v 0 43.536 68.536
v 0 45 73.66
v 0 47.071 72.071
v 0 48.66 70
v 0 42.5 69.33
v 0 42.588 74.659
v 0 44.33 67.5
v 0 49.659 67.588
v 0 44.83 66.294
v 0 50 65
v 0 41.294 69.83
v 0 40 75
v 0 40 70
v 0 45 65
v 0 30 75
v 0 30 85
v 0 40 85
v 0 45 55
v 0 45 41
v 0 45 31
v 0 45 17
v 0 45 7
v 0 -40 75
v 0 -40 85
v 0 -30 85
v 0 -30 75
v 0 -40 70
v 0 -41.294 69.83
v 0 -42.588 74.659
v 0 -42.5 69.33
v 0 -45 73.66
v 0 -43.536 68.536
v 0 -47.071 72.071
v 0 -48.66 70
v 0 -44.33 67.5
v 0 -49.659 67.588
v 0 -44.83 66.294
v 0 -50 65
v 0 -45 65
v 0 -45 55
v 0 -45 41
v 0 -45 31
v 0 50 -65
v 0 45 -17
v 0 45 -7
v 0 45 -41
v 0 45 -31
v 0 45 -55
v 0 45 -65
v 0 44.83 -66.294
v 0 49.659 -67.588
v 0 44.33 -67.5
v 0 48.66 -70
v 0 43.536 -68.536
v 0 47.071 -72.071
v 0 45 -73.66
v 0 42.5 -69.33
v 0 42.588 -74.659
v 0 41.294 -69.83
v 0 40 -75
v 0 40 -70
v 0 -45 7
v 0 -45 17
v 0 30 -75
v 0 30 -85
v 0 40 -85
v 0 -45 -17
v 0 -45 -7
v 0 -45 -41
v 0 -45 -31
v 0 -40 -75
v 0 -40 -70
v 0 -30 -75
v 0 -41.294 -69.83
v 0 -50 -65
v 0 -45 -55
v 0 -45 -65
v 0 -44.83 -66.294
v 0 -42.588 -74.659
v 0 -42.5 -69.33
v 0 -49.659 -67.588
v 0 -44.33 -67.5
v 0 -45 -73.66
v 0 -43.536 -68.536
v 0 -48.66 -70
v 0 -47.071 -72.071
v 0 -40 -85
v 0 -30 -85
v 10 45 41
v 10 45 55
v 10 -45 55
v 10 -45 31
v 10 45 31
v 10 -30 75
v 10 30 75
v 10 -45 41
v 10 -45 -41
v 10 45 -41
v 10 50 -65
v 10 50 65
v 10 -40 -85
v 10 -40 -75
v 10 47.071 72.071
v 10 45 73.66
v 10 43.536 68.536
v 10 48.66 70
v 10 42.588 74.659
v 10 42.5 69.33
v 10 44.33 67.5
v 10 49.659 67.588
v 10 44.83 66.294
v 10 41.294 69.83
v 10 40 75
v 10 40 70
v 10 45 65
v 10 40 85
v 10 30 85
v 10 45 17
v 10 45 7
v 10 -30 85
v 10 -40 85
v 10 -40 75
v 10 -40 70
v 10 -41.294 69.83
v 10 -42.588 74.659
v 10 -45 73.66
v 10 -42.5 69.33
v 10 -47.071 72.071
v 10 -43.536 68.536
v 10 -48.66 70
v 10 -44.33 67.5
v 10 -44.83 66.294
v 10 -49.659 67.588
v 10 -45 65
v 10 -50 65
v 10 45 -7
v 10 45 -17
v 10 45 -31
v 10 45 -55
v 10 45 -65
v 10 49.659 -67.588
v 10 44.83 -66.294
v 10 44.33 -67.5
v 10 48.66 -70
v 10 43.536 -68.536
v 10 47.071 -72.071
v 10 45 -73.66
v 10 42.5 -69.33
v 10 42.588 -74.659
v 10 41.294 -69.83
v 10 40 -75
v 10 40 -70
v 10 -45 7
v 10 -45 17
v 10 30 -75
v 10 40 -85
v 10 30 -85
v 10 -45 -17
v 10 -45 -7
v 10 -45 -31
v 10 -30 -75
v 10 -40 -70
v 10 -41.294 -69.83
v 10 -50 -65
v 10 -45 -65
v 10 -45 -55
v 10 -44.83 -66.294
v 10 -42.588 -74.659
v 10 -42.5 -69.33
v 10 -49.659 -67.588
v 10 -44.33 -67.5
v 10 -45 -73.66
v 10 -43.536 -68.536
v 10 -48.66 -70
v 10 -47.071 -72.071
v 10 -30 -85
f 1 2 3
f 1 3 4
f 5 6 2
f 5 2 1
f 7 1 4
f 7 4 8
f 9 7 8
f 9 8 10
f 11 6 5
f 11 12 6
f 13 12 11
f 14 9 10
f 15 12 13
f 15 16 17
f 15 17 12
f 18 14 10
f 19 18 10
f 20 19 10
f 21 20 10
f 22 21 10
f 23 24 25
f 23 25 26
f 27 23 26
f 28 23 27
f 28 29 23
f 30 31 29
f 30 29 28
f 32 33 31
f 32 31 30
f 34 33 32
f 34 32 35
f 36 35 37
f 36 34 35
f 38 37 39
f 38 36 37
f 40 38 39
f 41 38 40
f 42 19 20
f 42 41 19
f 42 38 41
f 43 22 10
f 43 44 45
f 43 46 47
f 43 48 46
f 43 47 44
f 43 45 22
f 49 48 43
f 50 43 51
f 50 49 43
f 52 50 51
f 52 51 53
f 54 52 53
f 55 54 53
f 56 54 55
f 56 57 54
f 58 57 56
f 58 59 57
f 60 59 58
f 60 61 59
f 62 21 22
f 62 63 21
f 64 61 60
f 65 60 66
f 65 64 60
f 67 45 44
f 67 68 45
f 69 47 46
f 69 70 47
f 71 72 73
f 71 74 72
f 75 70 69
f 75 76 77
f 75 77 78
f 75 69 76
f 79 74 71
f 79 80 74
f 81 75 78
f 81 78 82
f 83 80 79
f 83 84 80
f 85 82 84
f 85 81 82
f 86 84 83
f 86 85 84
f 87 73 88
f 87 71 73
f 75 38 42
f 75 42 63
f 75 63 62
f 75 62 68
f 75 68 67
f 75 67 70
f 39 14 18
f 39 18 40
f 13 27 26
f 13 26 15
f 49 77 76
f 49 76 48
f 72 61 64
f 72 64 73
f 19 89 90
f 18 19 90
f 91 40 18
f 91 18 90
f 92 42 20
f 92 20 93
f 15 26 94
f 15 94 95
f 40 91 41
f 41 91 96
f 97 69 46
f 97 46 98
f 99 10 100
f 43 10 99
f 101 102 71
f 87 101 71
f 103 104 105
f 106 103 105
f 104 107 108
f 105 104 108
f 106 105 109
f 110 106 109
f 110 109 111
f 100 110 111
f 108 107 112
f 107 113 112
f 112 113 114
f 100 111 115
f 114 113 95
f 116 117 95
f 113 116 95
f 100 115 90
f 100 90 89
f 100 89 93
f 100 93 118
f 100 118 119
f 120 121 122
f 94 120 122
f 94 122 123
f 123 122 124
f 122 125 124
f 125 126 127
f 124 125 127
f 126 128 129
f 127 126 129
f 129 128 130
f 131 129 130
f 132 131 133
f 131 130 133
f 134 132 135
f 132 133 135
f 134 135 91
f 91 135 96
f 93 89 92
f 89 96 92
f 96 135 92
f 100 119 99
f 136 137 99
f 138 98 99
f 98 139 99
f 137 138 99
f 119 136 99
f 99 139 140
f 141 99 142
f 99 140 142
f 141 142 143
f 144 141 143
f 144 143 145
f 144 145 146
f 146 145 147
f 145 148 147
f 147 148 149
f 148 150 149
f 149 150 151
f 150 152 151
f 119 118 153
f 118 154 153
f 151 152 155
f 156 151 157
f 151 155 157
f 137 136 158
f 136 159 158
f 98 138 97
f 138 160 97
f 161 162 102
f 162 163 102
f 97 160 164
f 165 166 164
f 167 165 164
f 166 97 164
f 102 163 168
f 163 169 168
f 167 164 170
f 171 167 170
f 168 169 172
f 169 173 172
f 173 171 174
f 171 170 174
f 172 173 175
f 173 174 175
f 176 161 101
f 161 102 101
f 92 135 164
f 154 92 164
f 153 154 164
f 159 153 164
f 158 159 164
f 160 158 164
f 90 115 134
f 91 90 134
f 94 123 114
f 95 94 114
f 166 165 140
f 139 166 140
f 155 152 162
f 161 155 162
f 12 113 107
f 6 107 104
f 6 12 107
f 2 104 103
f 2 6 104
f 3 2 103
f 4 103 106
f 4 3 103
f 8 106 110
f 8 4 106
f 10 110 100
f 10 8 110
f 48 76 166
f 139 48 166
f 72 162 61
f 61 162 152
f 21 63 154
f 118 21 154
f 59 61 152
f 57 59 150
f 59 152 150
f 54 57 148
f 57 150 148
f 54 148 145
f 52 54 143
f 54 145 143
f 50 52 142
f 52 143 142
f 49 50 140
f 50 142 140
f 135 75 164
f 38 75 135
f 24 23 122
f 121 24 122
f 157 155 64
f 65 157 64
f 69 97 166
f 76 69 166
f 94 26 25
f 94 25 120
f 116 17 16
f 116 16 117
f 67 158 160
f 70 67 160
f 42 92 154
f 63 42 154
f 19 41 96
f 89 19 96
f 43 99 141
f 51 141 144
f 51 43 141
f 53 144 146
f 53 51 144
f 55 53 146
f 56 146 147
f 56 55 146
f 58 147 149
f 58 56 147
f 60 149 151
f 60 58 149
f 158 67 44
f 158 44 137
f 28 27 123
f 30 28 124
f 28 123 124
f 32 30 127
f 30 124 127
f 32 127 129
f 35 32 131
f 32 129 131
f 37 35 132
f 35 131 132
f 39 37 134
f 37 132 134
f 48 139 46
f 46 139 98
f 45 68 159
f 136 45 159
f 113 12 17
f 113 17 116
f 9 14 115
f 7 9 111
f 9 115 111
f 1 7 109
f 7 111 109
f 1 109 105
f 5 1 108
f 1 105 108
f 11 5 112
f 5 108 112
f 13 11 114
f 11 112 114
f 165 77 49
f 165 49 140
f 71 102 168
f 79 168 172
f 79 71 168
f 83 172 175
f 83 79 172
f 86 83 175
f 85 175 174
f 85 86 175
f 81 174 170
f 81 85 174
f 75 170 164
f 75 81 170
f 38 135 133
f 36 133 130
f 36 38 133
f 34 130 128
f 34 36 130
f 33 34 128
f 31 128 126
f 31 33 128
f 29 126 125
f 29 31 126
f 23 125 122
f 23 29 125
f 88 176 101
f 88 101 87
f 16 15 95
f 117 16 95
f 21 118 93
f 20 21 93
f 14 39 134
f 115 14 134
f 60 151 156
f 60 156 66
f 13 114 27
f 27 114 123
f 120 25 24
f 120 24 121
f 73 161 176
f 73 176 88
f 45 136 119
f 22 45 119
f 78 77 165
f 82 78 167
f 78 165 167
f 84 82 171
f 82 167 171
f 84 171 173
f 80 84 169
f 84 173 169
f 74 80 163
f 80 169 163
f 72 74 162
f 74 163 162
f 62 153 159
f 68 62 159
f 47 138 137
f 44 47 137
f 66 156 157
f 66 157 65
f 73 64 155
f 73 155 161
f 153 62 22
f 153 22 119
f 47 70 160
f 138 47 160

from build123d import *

# Parameters (mm, degrees)
BOSS_EXTRUDE2_DEPTH = 10
CUT_EXTRUDE1_DEPTH  = 10
SKETCH3_W           = 10
SKETCH3_H           = 10
BOSS_EXTRUDE4_DEPTH = 10
SKETCH4_W           = 10
SKETCH4_H           = 10
BOSS_EXTRUDE5_DEPTH = 10
BOSS_EXTRUDE6_REACH = 129.867
SKETCH6_W           = 10
SKETCH6_H           = 10


with BuildPart() as part:
    # Sketch1 → Boss-Extrude2 (new body)
    with BuildSketch(Plane(origin=(0, 0, 0), x_dir=(0, 0, -1), z_dir=(1, 0, 0))):
        with BuildLine():
            Line((-65, 50), (65, 50))
            ThreePointArc((65, 50), (72.071067812, 47.071067812), (75, 40))
            Line((75, 40), (75, -40))
            ThreePointArc((75, -40), (72.071067812, -47.071067812), (65, -50))
            Line((65, -50), (-65, -50))
            ThreePointArc((-65, -50), (-72.071067812, -47.071067812), (-75, -40))
            Line((-75, -40), (-75, 40))
            ThreePointArc((-75, 40), (-72.071067812, 47.071067812), (-65, 50))
        make_face()
    extrude(amount=BOSS_EXTRUDE2_DEPTH)

    # Sketch2 → Cut-Extrude1 (cut)
    with BuildSketch(Plane(origin=(10, 0, 0), x_dir=(0, 0, -1), z_dir=(1, 0, 0))):
        with BuildLine():
            Line((-70, 40), (-70, -40))
            ThreePointArc((-70, -40), (-68.535533906, -43.535533906), (-65, -45))
            Line((-65, -45), (65, -45))
            ThreePointArc((65, -45), (68.535533906, -43.535533906), (70, -40))
            Line((70, -40), (70, 40))
            ThreePointArc((70, 40), (68.535533906, 43.535533906), (65, 45))
            Line((65, 45), (-65, 45))
            ThreePointArc((-65, 45), (-68.535533906, 43.535533906), (-70, 40))
        make_face()
    extrude(amount=-CUT_EXTRUDE1_DEPTH, mode=Mode.SUBTRACT)

    # Sketch3 → Boss-Extrude4 (add)
    with BuildSketch(Plane.XY.offset(75)):
        with Locations((5, 35)):
            Rectangle(SKETCH3_W, SKETCH3_H)
        with Locations((5, -35)):
            Rectangle(SKETCH3_W, SKETCH3_H)
    extrude(amount=BOSS_EXTRUDE4_DEPTH)

    # Sketch4 → Boss-Extrude5 (add)
    with BuildSketch(Plane(origin=(0, 0, -75), x_dir=(-1, 0, 0), z_dir=(0, 0, -1))):
        with Locations((-5, 35)):
            Rectangle(SKETCH4_W, SKETCH4_H)
        with Locations((-5, -35)):
            Rectangle(SKETCH4_W, SKETCH4_H)
    extrude(amount=BOSS_EXTRUDE5_DEPTH)

    # Boss-Extrude6: up to this face of the body (flat: up to its plane)
    boss_extrude6_end = Plane(part.part.faces().sort_by_distance((5, 45, 0))[0])
    # Sketch6 → Boss-Extrude6 (add, up to the picked face)
    with BuildSketch(Plane(origin=(0, -45, 0), x_dir=(1, 0, 0), z_dir=(0, 1, 0)), mode=Mode.PRIVATE) as boss_extrude6_sk1:
        with Locations((5, 60)):
            Rectangle(SKETCH6_W, SKETCH6_H)
    boss_extrude6_tool1 = split(extrude(boss_extrude6_sk1.sketch, amount=BOSS_EXTRUDE6_REACH, mode=Mode.PRIVATE), bisect_by=boss_extrude6_end, keep=Keep.BOTH, mode=Mode.PRIVATE)
    # Sketch6 → Boss-Extrude6 (add, up to the picked face)
    with BuildSketch(Plane(origin=(0, -45, 0), x_dir=(1, 0, 0), z_dir=(0, 1, 0)), mode=Mode.PRIVATE) as boss_extrude6_sk2:
        with Locations((5, 36)):
            Rectangle(SKETCH6_W, SKETCH6_H)
    boss_extrude6_tool2 = split(extrude(boss_extrude6_sk2.sketch, amount=BOSS_EXTRUDE6_REACH, mode=Mode.PRIVATE), bisect_by=boss_extrude6_end, keep=Keep.BOTH, mode=Mode.PRIVATE)
    # Sketch6 → Boss-Extrude6 (add, up to the picked face)
    with BuildSketch(Plane(origin=(0, -45, 0), x_dir=(1, 0, 0), z_dir=(0, 1, 0)), mode=Mode.PRIVATE) as boss_extrude6_sk3:
        with Locations((5, 12)):
            Rectangle(SKETCH6_W, SKETCH6_H)
    boss_extrude6_tool3 = split(extrude(boss_extrude6_sk3.sketch, amount=BOSS_EXTRUDE6_REACH, mode=Mode.PRIVATE), bisect_by=boss_extrude6_end, keep=Keep.BOTH, mode=Mode.PRIVATE)
    # Sketch6 → Boss-Extrude6 (add, up to the picked face)
    with BuildSketch(Plane(origin=(0, -45, 0), x_dir=(1, 0, 0), z_dir=(0, 1, 0)), mode=Mode.PRIVATE) as boss_extrude6_sk4:
        with Locations((5, -12)):
            Rectangle(SKETCH6_W, SKETCH6_H)
    boss_extrude6_tool4 = split(extrude(boss_extrude6_sk4.sketch, amount=BOSS_EXTRUDE6_REACH, mode=Mode.PRIVATE), bisect_by=boss_extrude6_end, keep=Keep.BOTH, mode=Mode.PRIVATE)
    # Sketch6 → Boss-Extrude6 (add, up to the picked face)
    with BuildSketch(Plane(origin=(0, -45, 0), x_dir=(1, 0, 0), z_dir=(0, 1, 0)), mode=Mode.PRIVATE) as boss_extrude6_sk5:
        with Locations((5, -60)):
            Rectangle(SKETCH6_W, SKETCH6_H)
    boss_extrude6_tool5 = split(extrude(boss_extrude6_sk5.sketch, amount=BOSS_EXTRUDE6_REACH, mode=Mode.PRIVATE), bisect_by=boss_extrude6_end, keep=Keep.BOTH, mode=Mode.PRIVATE)
    # Sketch6 → Boss-Extrude6 (add, up to the picked face)
    with BuildSketch(Plane(origin=(0, -45, 0), x_dir=(1, 0, 0), z_dir=(0, 1, 0)), mode=Mode.PRIVATE) as boss_extrude6_sk6:
        with Locations((5, -36)):
            Rectangle(SKETCH6_W, SKETCH6_H)
    boss_extrude6_tool6 = split(extrude(boss_extrude6_sk6.sketch, amount=BOSS_EXTRUDE6_REACH, mode=Mode.PRIVATE), bisect_by=boss_extrude6_end, keep=Keep.BOTH, mode=Mode.PRIVATE)
    add(boss_extrude6_tool1.solids().sort_by(Axis((5, -45, -60), (0, 1, 0)))[0])
    add(boss_extrude6_tool2.solids().sort_by(Axis((5, -45, -36), (0, 1, 0)))[0])
    add(boss_extrude6_tool3.solids().sort_by(Axis((5, -45, -12), (0, 1, 0)))[0])
    add(boss_extrude6_tool4.solids().sort_by(Axis((5, -45, 12), (0, 1, 0)))[0])
    add(boss_extrude6_tool5.solids().sort_by(Axis((5, -45, 60), (0, 1, 0)))[0])
    add(boss_extrude6_tool6.solids().sort_by(Axis((5, -45, 36), (0, 1, 0)))[0])


solid = part.part
